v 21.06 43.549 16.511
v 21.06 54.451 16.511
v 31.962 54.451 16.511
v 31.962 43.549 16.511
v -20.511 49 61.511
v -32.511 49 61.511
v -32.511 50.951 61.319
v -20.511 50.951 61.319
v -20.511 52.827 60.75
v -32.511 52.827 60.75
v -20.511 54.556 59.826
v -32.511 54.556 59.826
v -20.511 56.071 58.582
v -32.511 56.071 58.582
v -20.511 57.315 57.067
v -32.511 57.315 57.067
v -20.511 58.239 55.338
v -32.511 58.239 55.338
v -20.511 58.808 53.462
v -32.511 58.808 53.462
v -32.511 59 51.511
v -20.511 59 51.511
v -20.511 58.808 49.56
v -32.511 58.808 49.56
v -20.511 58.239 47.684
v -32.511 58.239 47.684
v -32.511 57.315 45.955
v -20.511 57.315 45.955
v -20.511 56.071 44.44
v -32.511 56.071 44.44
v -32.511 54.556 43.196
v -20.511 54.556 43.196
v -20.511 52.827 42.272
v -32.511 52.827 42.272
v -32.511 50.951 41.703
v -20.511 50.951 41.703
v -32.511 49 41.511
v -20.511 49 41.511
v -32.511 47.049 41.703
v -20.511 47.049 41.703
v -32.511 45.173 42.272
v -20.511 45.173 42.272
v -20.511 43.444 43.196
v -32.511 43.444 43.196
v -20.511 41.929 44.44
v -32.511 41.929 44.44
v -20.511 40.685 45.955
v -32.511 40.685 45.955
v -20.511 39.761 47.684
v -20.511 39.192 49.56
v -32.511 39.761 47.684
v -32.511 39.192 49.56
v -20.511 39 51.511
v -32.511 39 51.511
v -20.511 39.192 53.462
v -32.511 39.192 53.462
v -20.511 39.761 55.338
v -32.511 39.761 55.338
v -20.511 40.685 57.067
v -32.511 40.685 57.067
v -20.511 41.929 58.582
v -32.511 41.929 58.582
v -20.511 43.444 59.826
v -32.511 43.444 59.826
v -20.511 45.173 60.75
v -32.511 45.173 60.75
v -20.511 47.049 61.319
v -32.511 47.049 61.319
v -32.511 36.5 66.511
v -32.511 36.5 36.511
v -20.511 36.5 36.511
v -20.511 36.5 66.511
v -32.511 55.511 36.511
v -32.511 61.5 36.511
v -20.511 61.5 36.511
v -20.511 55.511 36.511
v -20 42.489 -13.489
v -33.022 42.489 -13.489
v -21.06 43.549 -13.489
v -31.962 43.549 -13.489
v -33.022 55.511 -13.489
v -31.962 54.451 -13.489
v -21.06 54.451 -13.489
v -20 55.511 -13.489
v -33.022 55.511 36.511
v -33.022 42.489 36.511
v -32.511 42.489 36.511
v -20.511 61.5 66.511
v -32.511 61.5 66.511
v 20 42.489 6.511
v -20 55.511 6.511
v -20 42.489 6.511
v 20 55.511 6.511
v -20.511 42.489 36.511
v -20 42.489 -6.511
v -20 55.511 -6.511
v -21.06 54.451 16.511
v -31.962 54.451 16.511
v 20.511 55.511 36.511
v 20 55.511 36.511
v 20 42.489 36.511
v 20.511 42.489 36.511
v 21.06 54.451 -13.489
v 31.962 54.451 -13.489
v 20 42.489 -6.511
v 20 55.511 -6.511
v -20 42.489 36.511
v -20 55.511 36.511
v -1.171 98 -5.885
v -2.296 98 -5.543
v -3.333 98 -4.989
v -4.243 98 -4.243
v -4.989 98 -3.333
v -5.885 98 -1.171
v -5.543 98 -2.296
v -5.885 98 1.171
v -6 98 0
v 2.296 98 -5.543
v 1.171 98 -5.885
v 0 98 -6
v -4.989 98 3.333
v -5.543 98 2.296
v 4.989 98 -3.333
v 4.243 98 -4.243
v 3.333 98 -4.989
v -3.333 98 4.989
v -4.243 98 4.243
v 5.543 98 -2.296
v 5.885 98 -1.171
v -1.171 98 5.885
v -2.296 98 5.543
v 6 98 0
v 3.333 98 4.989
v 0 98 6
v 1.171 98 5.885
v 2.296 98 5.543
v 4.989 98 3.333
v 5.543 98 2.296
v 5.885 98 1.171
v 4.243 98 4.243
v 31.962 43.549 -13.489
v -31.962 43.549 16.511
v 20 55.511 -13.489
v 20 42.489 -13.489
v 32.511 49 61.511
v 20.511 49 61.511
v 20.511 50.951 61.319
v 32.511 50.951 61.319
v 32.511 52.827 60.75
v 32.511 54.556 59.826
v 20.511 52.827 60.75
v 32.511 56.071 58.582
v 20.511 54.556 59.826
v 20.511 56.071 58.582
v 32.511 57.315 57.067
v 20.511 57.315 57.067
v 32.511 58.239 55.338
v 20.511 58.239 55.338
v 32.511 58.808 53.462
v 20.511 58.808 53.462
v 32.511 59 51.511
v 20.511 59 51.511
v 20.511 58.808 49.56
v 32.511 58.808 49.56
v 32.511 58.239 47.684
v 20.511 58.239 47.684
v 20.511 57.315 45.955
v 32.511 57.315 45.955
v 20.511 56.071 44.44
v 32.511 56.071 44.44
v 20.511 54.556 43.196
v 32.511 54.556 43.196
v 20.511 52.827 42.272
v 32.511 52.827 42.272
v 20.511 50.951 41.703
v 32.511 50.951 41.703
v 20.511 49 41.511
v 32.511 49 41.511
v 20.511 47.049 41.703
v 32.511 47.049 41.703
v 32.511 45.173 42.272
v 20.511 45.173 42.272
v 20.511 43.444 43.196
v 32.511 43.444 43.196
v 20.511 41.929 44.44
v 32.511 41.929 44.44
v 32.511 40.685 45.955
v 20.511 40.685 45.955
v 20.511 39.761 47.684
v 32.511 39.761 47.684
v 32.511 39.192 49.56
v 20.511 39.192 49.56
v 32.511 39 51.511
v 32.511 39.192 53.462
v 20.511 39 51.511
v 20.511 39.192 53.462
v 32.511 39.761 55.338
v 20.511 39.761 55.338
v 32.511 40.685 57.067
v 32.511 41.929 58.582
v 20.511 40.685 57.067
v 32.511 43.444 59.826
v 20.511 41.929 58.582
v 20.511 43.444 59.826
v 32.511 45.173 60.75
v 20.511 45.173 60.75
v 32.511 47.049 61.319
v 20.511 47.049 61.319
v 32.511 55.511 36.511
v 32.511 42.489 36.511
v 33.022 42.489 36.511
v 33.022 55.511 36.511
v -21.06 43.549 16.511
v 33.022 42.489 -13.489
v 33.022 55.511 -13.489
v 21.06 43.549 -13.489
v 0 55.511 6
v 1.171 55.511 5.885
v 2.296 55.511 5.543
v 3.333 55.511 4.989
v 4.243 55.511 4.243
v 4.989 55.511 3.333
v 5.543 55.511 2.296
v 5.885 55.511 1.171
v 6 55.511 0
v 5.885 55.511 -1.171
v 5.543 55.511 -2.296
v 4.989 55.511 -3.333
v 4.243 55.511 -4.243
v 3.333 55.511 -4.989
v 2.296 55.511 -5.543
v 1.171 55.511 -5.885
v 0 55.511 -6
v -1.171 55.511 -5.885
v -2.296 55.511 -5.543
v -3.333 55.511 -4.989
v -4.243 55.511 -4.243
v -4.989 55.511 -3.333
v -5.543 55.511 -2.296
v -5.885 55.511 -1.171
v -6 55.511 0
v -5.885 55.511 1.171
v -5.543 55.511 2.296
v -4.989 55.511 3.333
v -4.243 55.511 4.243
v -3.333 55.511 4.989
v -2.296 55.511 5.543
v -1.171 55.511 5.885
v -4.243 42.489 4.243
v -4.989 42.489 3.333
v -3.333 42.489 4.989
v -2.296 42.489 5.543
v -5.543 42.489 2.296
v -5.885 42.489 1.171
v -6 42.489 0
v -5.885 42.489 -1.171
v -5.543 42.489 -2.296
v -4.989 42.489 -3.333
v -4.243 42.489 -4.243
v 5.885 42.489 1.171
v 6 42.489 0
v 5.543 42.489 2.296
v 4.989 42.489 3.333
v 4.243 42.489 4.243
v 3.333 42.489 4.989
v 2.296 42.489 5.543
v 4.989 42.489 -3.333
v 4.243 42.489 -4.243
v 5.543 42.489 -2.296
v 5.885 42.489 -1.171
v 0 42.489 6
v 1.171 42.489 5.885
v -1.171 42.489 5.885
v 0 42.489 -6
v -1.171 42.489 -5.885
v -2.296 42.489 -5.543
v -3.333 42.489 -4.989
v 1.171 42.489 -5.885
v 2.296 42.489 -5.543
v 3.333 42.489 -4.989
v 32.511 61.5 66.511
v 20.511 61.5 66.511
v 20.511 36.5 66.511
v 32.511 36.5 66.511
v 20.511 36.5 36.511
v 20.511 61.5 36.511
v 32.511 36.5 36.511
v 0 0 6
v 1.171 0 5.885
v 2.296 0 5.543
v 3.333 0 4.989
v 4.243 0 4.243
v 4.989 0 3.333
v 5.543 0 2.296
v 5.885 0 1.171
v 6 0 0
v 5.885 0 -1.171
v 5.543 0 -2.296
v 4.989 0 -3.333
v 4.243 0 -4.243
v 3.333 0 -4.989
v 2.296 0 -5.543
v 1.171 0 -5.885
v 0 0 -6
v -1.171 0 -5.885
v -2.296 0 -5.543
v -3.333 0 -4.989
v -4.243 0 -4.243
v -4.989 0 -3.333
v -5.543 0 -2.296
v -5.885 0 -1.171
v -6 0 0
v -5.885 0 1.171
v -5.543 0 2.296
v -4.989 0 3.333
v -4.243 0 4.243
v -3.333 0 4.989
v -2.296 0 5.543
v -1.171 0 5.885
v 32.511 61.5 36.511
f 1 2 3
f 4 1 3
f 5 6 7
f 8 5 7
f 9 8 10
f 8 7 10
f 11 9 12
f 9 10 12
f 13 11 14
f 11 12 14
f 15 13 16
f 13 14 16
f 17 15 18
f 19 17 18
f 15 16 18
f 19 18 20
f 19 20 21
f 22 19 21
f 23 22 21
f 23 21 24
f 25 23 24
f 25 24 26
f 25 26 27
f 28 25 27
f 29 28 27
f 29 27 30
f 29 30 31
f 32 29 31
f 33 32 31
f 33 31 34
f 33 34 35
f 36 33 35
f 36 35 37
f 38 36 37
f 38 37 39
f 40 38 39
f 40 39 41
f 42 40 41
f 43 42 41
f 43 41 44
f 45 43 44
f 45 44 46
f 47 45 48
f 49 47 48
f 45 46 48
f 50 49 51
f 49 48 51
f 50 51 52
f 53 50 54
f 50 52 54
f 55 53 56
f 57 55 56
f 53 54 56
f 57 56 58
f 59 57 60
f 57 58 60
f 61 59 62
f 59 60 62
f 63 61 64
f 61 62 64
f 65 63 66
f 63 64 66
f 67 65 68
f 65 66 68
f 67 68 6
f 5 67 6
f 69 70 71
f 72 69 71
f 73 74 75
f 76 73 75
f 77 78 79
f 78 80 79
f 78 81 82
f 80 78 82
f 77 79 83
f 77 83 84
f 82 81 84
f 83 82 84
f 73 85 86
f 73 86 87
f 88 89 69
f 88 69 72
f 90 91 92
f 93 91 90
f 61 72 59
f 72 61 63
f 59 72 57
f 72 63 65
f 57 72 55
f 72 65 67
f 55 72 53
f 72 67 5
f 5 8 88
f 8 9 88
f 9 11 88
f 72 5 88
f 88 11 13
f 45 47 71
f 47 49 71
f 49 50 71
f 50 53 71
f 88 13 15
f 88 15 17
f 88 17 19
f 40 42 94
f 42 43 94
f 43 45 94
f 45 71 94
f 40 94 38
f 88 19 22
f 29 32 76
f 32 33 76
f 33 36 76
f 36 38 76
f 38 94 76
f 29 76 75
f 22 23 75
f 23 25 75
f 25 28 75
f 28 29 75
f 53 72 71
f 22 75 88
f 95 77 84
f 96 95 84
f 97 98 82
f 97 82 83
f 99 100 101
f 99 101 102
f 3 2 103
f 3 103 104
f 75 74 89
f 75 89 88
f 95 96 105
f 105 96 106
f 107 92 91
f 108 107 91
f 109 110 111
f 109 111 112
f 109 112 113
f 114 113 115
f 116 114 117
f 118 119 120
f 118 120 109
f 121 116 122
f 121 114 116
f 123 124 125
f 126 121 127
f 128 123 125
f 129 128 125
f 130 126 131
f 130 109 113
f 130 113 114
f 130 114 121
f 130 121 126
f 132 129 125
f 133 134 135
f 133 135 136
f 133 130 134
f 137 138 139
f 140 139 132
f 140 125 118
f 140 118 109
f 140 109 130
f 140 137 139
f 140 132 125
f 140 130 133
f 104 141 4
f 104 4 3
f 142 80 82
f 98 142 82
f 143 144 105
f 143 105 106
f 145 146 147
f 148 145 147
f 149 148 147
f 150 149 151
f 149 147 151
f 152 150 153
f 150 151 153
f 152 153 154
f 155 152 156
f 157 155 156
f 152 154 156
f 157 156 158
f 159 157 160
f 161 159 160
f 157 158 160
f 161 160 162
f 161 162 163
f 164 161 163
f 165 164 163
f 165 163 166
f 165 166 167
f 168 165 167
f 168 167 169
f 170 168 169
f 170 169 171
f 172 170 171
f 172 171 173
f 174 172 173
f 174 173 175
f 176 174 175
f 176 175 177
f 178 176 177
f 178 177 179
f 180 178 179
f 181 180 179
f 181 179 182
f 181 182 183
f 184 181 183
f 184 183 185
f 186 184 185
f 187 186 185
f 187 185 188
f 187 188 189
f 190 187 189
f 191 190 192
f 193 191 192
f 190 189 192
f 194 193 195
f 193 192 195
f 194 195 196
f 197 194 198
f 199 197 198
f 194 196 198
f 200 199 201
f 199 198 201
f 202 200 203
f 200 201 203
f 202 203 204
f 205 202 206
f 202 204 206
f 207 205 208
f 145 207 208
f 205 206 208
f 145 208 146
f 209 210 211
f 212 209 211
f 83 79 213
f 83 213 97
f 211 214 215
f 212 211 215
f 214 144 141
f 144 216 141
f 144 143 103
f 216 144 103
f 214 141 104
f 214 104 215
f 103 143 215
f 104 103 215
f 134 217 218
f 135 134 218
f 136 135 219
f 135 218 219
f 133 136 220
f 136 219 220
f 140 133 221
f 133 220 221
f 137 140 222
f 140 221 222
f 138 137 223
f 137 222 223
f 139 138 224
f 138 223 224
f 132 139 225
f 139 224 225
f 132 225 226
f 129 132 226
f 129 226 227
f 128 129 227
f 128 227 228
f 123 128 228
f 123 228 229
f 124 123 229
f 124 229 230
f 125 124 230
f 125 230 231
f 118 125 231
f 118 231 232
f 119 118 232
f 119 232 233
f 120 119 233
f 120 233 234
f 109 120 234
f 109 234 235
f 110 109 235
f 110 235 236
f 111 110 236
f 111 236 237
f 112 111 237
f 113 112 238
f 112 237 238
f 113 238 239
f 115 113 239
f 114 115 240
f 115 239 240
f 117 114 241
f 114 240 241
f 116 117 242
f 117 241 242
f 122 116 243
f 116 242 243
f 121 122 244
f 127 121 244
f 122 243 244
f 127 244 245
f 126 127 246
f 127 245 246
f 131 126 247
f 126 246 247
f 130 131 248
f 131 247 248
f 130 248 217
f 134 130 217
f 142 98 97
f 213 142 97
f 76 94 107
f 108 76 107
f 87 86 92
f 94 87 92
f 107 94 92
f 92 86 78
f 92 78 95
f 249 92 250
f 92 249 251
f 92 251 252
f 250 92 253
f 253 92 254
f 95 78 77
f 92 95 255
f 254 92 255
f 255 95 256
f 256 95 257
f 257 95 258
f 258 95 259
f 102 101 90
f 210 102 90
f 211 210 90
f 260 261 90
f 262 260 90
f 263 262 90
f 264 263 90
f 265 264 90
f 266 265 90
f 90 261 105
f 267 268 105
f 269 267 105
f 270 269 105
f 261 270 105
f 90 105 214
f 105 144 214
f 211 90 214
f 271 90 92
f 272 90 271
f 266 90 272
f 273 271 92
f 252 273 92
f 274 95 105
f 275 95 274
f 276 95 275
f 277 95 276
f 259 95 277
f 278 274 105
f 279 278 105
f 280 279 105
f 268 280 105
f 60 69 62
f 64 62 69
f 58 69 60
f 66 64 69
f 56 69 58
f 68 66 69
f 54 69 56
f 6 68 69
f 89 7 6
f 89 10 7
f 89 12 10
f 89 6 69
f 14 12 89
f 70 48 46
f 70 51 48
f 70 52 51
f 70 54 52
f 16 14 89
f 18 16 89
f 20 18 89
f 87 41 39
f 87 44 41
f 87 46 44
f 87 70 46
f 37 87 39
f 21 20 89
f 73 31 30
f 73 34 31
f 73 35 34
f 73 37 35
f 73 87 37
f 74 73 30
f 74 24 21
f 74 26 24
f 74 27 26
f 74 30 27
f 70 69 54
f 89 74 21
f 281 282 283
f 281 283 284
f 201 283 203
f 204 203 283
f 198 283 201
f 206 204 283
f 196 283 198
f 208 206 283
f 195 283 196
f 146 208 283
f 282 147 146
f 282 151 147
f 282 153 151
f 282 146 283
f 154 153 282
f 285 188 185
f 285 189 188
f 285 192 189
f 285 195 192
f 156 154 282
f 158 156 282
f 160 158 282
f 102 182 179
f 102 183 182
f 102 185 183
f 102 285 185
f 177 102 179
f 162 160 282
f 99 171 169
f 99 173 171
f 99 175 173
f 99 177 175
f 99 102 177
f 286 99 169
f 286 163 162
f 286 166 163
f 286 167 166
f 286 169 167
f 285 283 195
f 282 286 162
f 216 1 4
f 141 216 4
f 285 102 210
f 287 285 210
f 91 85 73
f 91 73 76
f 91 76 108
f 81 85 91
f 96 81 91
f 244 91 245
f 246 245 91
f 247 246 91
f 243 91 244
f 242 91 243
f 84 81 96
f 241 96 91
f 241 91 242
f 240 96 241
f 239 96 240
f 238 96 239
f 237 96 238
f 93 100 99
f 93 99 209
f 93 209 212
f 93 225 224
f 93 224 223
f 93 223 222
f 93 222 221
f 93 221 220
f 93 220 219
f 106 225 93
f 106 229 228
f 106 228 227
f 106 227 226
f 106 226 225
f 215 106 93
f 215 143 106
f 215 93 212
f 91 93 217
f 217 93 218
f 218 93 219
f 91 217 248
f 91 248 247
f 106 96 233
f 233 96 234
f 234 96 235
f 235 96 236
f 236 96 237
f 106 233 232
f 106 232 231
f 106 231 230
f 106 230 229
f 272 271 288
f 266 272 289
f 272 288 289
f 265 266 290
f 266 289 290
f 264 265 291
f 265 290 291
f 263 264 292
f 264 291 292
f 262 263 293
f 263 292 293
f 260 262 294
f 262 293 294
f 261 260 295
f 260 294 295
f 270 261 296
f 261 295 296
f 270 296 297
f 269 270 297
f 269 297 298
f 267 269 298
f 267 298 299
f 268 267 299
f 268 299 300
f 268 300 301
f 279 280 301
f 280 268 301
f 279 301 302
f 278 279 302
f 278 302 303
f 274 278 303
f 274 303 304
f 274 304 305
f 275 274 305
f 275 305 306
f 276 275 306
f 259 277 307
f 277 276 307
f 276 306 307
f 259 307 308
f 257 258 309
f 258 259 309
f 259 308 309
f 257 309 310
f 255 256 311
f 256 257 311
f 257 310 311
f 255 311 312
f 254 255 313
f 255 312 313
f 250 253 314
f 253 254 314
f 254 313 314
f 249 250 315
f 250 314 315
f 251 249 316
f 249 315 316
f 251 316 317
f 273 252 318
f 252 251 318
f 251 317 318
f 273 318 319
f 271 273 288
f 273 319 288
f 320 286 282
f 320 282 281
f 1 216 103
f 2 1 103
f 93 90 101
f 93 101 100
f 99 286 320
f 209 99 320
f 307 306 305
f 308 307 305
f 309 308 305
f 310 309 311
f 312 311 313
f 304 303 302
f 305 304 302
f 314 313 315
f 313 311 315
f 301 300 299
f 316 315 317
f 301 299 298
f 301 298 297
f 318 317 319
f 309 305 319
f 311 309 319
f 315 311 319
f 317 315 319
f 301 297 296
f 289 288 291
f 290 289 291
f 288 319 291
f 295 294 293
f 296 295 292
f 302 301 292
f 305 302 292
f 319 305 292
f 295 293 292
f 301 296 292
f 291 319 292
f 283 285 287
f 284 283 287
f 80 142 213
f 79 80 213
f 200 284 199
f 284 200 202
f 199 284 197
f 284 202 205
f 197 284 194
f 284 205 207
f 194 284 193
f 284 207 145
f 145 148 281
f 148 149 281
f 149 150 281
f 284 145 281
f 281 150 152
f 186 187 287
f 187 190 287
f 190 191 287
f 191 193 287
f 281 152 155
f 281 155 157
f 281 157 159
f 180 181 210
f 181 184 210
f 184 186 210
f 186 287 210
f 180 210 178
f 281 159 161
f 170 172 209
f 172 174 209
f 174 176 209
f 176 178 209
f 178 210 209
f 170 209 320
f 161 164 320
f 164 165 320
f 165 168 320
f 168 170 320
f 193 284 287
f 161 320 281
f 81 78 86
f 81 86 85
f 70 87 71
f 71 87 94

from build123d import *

# Parameters (mm, degrees)
SKETCH1_R                = 6
BOSS_EXTRUDE1_DEPTH      = 98
BOSS_EXTRUDE2_START      = -42.489
SKETCH2_W                = 40
SKETCH2_H                = 13.022
BOSS_EXTRUDE2_DEPTH      = 13.022
BOSS_EXTRUDE3_DEPTH      = 30
BOSS_EXTRUDE3_DEPTH_BACK = 20
SKETCH4_W                = 13.022
SKETCH4_H                = 13.022
SKETCH6_W                = 10.902
SKETCH6_H                = 10.902
CUT_EXTRUDE1_DEPTH       = 60
BOSS_EXTRUDE4_START      = 10
SKETCH7_W                = 10.902
SKETCH7_H                = 10.902
BOSS_EXTRUDE4_DEPTH      = 20
SKETCH8_W                = 12
SKETCH8_H                = 25
BOSS_EXTRUDE5_DEPTH      = 30
SKETCH9_R                = 10
CUT_EXTRUDE2_DEPTH       = 100


with BuildPart() as part:
    # Sketch1 → Boss-Extrude1 (new body)
    with BuildSketch(Plane(origin=(0, 0, 0), x_dir=(1, 0, 0), z_dir=(0, 1, 0))):
        with Locations(Location((0, 0, 0), (0, 0, 270))):
            Circle(SKETCH1_R)
    extrude(amount=BOSS_EXTRUDE1_DEPTH)

    # Sketch2 → Boss-Extrude2 (add)
    with BuildSketch(Plane(origin=(0, 98, 0), x_dir=(1, 0, 0), z_dir=(0, 1, 0)).offset(BOSS_EXTRUDE2_START)):
        Rectangle(SKETCH2_W, SKETCH2_H)
    extrude(amount=-BOSS_EXTRUDE2_DEPTH)

    # Sketch4 → Boss-Extrude3 (add, two sides: drawn at the far end of the back side and taken through both)
    with BuildSketch(Plane.XY.offset(6.511).offset(-BOSS_EXTRUDE3_DEPTH_BACK)):
        with Locations((-26.511, 49)):
            Rectangle(SKETCH4_W, SKETCH4_H)
        with Locations((26.511, 49)):
            Rectangle(SKETCH4_W, SKETCH4_H)
    extrude(amount=BOSS_EXTRUDE3_DEPTH + BOSS_EXTRUDE3_DEPTH_BACK)

    # Sketch6 → Cut-Extrude1 (cut)
    with BuildSketch(Plane.XY.offset(36.511)):
        with Locations((-26.511, 49)):
            Rectangle(SKETCH6_W, SKETCH6_H)
        with Locations((26.511, 49)):
            Rectangle(SKETCH6_W, SKETCH6_H)
    extrude(amount=-CUT_EXTRUDE1_DEPTH, mode=Mode.SUBTRACT)

    # Sketch7 → Boss-Extrude4 (add)
    with BuildSketch(Plane.XY.offset(6.511).offset(BOSS_EXTRUDE4_START)):
        with Locations((-26.511, 49)):
            Rectangle(SKETCH7_W, SKETCH7_H)
        with Locations((26.511, 49)):
            Rectangle(SKETCH7_W, SKETCH7_H)
    extrude(amount=BOSS_EXTRUDE4_DEPTH)

    # Sketch8 → Boss-Extrude5 (add)
    with BuildSketch(Plane.XY.offset(36.511)):
        with Locations((-26.511, 49)):
            Rectangle(SKETCH8_W, SKETCH8_H)
        with Locations((26.511, 49)):
            Rectangle(SKETCH8_W, SKETCH8_H)
    extrude(amount=BOSS_EXTRUDE5_DEPTH)

    # Sketch9 → Cut-Extrude2 (cut)
    with BuildSketch(Plane.ZY.offset(32.511)):
        with Locations((51.511, 49)):
            Circle(SKETCH9_R)
    extrude(amount=-CUT_EXTRUDE2_DEPTH, mode=Mode.SUBTRACT)


solid = part.part
